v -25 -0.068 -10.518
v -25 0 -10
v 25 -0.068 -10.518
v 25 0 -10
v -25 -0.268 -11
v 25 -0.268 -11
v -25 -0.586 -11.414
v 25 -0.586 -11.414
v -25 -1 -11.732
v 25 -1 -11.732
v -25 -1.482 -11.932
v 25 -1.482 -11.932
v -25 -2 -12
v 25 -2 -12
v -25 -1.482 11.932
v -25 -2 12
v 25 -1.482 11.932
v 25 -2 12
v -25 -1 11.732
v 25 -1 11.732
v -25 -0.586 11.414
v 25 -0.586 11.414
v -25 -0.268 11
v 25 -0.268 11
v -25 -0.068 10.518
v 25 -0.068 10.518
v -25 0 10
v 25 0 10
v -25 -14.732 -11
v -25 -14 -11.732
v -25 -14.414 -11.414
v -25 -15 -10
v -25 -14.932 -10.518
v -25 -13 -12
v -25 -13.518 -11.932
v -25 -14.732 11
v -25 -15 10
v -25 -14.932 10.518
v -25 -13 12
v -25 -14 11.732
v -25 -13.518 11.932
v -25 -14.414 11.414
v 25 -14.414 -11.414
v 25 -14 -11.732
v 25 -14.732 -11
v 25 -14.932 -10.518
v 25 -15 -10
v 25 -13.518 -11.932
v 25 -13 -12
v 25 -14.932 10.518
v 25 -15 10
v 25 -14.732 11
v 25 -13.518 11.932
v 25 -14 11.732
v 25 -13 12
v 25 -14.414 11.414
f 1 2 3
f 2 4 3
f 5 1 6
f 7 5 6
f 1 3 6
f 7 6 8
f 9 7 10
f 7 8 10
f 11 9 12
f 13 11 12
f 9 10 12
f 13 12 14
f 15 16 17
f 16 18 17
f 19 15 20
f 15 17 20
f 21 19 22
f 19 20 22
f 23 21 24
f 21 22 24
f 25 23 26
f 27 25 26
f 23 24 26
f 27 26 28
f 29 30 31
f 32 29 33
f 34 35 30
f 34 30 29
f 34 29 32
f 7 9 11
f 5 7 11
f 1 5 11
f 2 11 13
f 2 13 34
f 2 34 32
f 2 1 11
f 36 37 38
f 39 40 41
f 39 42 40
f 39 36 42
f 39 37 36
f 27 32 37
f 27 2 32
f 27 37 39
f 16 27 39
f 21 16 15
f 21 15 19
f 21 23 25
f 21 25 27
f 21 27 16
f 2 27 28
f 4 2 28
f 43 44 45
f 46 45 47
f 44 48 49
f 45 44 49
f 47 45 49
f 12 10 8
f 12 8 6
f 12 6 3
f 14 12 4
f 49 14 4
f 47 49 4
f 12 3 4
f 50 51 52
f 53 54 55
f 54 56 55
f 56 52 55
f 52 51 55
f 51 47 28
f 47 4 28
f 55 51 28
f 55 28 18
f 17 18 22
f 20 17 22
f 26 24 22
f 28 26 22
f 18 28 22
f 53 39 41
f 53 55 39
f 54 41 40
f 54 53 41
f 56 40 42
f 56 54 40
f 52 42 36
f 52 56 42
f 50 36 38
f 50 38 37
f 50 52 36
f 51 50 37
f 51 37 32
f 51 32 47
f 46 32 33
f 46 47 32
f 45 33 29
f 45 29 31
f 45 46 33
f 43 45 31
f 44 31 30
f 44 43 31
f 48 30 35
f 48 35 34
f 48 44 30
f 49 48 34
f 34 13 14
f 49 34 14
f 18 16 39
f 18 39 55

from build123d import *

# Parameters (mm, degrees)
F0_W     = 50
F0_H     = 24
F1_DEPTH = 15
F2_R     = 2
F3_R     = 2
F4_R     = 2


# Not quite as in the source:
# - the program builds the solid bodies; features that only make, move or delete a surface that nothing else refers to are left out


with BuildPart() as f1:
    # F0 (on Front) → F1 (new body)
    with BuildSketch(Plane.XZ):
        Rectangle(F0_W, F0_H)
    extrude(amount=F1_DEPTH)

    # F2
    f2_edges = [f1.edges().sort_by_distance(p)[0] for p in [
        (0, -15, 12),
    ]]
    fillet(f2_edges, radius=F2_R)

    # F3
    f3_edges = [f1.edges().sort_by_distance(p)[0] for p in [
        (0, 0, 12),
        (0, -15, -12),
    ]]
    fillet(f3_edges, radius=F3_R)

    # F4
    f4_edges = [f1.edges().sort_by_distance(p)[0] for p in [
        (0, 0, -12),
    ]]
    fillet(f4_edges, radius=F4_R)


solid = f1.part
